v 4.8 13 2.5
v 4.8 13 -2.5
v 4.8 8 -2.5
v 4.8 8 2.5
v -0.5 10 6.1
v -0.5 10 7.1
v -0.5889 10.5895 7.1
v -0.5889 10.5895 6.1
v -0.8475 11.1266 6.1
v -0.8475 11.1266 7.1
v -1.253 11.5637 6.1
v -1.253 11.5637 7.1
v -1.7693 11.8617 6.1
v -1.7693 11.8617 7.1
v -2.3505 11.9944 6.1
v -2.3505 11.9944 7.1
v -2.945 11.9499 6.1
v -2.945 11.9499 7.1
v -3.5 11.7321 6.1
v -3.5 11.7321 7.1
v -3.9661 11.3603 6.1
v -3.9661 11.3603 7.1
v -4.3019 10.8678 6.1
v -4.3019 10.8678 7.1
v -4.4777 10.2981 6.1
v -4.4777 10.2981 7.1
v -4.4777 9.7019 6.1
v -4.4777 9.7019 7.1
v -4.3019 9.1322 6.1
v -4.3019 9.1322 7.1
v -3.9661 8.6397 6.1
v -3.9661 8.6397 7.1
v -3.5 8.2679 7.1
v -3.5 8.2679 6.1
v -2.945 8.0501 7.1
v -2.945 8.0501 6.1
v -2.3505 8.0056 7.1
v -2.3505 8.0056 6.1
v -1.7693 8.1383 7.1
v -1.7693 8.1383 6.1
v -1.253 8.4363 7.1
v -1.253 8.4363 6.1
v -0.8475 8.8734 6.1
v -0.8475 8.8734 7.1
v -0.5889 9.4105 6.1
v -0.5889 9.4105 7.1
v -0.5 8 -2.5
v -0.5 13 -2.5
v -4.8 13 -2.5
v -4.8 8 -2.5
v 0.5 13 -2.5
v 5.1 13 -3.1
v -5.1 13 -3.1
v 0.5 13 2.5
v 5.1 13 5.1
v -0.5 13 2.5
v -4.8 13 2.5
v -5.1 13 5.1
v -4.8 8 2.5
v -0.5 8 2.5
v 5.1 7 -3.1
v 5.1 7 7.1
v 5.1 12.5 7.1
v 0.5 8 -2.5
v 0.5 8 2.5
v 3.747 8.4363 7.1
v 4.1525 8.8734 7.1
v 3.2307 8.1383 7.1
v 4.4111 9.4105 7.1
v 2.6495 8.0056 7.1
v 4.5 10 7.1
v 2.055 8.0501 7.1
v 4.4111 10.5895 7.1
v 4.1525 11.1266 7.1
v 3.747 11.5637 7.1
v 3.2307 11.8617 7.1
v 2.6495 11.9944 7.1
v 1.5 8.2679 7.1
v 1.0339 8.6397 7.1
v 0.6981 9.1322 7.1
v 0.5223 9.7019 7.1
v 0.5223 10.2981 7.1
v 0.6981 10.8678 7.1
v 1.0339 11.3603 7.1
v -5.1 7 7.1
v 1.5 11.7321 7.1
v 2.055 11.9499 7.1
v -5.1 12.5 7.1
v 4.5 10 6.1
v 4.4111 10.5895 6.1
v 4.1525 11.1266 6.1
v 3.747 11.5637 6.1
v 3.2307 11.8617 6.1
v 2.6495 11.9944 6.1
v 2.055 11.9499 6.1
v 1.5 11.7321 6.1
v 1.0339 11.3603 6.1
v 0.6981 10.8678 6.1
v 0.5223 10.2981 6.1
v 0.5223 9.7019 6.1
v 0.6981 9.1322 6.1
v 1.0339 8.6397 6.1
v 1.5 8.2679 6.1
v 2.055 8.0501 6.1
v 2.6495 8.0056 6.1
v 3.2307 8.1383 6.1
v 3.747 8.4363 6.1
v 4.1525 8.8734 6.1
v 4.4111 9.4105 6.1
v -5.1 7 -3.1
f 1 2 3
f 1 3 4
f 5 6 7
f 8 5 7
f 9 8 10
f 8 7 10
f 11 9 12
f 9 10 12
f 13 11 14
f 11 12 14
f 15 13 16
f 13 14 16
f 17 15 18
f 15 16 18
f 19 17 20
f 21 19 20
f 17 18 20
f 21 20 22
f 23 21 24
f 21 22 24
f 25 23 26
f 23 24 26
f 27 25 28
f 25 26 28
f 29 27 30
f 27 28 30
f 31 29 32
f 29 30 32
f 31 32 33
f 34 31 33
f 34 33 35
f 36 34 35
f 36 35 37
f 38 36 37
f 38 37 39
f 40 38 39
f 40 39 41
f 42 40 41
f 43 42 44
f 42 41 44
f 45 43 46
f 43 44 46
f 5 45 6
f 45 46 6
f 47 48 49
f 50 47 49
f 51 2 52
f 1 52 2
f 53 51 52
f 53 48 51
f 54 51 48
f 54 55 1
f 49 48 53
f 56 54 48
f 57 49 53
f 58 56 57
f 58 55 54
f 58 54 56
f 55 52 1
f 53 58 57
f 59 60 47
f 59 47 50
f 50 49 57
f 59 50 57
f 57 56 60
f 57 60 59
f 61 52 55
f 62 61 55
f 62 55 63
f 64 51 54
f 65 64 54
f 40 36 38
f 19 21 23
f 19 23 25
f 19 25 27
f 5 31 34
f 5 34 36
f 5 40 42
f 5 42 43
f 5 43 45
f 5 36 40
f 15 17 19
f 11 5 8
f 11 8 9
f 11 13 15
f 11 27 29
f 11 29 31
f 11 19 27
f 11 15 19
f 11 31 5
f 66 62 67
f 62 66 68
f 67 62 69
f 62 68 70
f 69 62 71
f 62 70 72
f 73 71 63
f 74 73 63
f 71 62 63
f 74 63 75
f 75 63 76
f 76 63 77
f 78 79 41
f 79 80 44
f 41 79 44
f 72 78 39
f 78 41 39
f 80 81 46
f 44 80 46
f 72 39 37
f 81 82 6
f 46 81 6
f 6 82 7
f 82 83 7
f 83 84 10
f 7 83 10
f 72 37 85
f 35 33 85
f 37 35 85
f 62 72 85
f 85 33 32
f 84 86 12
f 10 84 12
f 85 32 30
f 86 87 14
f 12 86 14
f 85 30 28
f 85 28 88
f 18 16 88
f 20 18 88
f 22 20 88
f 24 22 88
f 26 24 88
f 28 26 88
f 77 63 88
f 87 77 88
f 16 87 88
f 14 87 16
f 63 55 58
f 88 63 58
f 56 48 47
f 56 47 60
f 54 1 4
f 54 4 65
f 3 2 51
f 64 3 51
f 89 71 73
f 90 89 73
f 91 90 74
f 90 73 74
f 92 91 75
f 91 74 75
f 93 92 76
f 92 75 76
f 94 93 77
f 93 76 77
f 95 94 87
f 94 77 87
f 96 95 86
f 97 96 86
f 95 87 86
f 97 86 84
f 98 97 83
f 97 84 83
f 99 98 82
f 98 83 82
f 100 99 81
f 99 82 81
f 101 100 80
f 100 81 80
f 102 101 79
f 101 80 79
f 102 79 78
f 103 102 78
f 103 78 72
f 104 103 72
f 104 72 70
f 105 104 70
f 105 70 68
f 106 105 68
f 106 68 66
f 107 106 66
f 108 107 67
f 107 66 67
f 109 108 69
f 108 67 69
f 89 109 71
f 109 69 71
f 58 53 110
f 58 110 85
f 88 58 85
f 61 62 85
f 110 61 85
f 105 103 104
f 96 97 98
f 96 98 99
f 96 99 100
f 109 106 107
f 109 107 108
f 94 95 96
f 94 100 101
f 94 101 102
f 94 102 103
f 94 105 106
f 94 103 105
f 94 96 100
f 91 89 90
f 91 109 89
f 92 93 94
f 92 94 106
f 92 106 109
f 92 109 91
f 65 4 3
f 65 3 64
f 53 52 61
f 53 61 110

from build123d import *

# Parameters (mm, degrees)
SKETCH052_W       = 10.2
SKETCH052_H       = 10.2
PAD044_DEPTH      = 4
PAD044_DEPTH_BACK = 2
SKETCH053_R       = 2
POCKET004_DEPTH   = 1
CHAMFER006_SIZE2  = 2
CHAMFER006_SIZE   = 0.5
SKETCH049_W       = 4.3
SKETCH049_H       = 5
POCKET006_DEPTH   = 5


with BuildPart() as part:
    # Sketch052 (on Face1 of CopyFillet001) → Pad044 (new body, two sides)
    with BuildSketch(Plane(origin=(0, 9, 0), x_dir=(-1, 0, 0), z_dir=(0, 1, 0))) as pad044_sk:
        with Locations((0, 2)):
            Rectangle(SKETCH052_W, SKETCH052_H)
    extrude(amount=PAD044_DEPTH)
    extrude(pad044_sk.sketch, amount=-PAD044_DEPTH_BACK)

    # Sketch053 (on Face1 of Pad044) → Pocket004 (cut)
    with BuildSketch(Plane(origin=(0, 9, 7.1), x_dir=(1, 0, 0), z_dir=(0, 0, 1))):
        with Locations((-2.5, 1)):
            Circle(SKETCH053_R)
        with Locations((2.5, 1)):
            Circle(SKETCH053_R)
    extrude(amount=-POCKET004_DEPTH, mode=Mode.SUBTRACT)

    # Chamfer006
    chamfer006_edges = [part.edges().sort_by_distance(p)[0] for p in [
        (0, 13, 7.1),
    ]]
    chamfer006_side = part.faces().sort_by_distance((0, 10, 7.1))[0]
    chamfer(chamfer006_edges, length=CHAMFER006_SIZE, length2=CHAMFER006_SIZE2, reference=chamfer006_side)

    # Sketch049 (on Face8 of Chamfer006) → Pocket006 (cut)
    with BuildSketch(Plane(origin=(0, 13, 0), x_dir=(-1, 0, 0), z_dir=(0, 1, 0))):
        with Locations((-2.65, 0)):
            Rectangle(SKETCH049_W, SKETCH049_H)
        with Locations((2.65, 0)):
            Rectangle(SKETCH049_W, SKETCH049_H)
    extrude(amount=-POCKET006_DEPTH, mode=Mode.SUBTRACT)


solid = part.part
